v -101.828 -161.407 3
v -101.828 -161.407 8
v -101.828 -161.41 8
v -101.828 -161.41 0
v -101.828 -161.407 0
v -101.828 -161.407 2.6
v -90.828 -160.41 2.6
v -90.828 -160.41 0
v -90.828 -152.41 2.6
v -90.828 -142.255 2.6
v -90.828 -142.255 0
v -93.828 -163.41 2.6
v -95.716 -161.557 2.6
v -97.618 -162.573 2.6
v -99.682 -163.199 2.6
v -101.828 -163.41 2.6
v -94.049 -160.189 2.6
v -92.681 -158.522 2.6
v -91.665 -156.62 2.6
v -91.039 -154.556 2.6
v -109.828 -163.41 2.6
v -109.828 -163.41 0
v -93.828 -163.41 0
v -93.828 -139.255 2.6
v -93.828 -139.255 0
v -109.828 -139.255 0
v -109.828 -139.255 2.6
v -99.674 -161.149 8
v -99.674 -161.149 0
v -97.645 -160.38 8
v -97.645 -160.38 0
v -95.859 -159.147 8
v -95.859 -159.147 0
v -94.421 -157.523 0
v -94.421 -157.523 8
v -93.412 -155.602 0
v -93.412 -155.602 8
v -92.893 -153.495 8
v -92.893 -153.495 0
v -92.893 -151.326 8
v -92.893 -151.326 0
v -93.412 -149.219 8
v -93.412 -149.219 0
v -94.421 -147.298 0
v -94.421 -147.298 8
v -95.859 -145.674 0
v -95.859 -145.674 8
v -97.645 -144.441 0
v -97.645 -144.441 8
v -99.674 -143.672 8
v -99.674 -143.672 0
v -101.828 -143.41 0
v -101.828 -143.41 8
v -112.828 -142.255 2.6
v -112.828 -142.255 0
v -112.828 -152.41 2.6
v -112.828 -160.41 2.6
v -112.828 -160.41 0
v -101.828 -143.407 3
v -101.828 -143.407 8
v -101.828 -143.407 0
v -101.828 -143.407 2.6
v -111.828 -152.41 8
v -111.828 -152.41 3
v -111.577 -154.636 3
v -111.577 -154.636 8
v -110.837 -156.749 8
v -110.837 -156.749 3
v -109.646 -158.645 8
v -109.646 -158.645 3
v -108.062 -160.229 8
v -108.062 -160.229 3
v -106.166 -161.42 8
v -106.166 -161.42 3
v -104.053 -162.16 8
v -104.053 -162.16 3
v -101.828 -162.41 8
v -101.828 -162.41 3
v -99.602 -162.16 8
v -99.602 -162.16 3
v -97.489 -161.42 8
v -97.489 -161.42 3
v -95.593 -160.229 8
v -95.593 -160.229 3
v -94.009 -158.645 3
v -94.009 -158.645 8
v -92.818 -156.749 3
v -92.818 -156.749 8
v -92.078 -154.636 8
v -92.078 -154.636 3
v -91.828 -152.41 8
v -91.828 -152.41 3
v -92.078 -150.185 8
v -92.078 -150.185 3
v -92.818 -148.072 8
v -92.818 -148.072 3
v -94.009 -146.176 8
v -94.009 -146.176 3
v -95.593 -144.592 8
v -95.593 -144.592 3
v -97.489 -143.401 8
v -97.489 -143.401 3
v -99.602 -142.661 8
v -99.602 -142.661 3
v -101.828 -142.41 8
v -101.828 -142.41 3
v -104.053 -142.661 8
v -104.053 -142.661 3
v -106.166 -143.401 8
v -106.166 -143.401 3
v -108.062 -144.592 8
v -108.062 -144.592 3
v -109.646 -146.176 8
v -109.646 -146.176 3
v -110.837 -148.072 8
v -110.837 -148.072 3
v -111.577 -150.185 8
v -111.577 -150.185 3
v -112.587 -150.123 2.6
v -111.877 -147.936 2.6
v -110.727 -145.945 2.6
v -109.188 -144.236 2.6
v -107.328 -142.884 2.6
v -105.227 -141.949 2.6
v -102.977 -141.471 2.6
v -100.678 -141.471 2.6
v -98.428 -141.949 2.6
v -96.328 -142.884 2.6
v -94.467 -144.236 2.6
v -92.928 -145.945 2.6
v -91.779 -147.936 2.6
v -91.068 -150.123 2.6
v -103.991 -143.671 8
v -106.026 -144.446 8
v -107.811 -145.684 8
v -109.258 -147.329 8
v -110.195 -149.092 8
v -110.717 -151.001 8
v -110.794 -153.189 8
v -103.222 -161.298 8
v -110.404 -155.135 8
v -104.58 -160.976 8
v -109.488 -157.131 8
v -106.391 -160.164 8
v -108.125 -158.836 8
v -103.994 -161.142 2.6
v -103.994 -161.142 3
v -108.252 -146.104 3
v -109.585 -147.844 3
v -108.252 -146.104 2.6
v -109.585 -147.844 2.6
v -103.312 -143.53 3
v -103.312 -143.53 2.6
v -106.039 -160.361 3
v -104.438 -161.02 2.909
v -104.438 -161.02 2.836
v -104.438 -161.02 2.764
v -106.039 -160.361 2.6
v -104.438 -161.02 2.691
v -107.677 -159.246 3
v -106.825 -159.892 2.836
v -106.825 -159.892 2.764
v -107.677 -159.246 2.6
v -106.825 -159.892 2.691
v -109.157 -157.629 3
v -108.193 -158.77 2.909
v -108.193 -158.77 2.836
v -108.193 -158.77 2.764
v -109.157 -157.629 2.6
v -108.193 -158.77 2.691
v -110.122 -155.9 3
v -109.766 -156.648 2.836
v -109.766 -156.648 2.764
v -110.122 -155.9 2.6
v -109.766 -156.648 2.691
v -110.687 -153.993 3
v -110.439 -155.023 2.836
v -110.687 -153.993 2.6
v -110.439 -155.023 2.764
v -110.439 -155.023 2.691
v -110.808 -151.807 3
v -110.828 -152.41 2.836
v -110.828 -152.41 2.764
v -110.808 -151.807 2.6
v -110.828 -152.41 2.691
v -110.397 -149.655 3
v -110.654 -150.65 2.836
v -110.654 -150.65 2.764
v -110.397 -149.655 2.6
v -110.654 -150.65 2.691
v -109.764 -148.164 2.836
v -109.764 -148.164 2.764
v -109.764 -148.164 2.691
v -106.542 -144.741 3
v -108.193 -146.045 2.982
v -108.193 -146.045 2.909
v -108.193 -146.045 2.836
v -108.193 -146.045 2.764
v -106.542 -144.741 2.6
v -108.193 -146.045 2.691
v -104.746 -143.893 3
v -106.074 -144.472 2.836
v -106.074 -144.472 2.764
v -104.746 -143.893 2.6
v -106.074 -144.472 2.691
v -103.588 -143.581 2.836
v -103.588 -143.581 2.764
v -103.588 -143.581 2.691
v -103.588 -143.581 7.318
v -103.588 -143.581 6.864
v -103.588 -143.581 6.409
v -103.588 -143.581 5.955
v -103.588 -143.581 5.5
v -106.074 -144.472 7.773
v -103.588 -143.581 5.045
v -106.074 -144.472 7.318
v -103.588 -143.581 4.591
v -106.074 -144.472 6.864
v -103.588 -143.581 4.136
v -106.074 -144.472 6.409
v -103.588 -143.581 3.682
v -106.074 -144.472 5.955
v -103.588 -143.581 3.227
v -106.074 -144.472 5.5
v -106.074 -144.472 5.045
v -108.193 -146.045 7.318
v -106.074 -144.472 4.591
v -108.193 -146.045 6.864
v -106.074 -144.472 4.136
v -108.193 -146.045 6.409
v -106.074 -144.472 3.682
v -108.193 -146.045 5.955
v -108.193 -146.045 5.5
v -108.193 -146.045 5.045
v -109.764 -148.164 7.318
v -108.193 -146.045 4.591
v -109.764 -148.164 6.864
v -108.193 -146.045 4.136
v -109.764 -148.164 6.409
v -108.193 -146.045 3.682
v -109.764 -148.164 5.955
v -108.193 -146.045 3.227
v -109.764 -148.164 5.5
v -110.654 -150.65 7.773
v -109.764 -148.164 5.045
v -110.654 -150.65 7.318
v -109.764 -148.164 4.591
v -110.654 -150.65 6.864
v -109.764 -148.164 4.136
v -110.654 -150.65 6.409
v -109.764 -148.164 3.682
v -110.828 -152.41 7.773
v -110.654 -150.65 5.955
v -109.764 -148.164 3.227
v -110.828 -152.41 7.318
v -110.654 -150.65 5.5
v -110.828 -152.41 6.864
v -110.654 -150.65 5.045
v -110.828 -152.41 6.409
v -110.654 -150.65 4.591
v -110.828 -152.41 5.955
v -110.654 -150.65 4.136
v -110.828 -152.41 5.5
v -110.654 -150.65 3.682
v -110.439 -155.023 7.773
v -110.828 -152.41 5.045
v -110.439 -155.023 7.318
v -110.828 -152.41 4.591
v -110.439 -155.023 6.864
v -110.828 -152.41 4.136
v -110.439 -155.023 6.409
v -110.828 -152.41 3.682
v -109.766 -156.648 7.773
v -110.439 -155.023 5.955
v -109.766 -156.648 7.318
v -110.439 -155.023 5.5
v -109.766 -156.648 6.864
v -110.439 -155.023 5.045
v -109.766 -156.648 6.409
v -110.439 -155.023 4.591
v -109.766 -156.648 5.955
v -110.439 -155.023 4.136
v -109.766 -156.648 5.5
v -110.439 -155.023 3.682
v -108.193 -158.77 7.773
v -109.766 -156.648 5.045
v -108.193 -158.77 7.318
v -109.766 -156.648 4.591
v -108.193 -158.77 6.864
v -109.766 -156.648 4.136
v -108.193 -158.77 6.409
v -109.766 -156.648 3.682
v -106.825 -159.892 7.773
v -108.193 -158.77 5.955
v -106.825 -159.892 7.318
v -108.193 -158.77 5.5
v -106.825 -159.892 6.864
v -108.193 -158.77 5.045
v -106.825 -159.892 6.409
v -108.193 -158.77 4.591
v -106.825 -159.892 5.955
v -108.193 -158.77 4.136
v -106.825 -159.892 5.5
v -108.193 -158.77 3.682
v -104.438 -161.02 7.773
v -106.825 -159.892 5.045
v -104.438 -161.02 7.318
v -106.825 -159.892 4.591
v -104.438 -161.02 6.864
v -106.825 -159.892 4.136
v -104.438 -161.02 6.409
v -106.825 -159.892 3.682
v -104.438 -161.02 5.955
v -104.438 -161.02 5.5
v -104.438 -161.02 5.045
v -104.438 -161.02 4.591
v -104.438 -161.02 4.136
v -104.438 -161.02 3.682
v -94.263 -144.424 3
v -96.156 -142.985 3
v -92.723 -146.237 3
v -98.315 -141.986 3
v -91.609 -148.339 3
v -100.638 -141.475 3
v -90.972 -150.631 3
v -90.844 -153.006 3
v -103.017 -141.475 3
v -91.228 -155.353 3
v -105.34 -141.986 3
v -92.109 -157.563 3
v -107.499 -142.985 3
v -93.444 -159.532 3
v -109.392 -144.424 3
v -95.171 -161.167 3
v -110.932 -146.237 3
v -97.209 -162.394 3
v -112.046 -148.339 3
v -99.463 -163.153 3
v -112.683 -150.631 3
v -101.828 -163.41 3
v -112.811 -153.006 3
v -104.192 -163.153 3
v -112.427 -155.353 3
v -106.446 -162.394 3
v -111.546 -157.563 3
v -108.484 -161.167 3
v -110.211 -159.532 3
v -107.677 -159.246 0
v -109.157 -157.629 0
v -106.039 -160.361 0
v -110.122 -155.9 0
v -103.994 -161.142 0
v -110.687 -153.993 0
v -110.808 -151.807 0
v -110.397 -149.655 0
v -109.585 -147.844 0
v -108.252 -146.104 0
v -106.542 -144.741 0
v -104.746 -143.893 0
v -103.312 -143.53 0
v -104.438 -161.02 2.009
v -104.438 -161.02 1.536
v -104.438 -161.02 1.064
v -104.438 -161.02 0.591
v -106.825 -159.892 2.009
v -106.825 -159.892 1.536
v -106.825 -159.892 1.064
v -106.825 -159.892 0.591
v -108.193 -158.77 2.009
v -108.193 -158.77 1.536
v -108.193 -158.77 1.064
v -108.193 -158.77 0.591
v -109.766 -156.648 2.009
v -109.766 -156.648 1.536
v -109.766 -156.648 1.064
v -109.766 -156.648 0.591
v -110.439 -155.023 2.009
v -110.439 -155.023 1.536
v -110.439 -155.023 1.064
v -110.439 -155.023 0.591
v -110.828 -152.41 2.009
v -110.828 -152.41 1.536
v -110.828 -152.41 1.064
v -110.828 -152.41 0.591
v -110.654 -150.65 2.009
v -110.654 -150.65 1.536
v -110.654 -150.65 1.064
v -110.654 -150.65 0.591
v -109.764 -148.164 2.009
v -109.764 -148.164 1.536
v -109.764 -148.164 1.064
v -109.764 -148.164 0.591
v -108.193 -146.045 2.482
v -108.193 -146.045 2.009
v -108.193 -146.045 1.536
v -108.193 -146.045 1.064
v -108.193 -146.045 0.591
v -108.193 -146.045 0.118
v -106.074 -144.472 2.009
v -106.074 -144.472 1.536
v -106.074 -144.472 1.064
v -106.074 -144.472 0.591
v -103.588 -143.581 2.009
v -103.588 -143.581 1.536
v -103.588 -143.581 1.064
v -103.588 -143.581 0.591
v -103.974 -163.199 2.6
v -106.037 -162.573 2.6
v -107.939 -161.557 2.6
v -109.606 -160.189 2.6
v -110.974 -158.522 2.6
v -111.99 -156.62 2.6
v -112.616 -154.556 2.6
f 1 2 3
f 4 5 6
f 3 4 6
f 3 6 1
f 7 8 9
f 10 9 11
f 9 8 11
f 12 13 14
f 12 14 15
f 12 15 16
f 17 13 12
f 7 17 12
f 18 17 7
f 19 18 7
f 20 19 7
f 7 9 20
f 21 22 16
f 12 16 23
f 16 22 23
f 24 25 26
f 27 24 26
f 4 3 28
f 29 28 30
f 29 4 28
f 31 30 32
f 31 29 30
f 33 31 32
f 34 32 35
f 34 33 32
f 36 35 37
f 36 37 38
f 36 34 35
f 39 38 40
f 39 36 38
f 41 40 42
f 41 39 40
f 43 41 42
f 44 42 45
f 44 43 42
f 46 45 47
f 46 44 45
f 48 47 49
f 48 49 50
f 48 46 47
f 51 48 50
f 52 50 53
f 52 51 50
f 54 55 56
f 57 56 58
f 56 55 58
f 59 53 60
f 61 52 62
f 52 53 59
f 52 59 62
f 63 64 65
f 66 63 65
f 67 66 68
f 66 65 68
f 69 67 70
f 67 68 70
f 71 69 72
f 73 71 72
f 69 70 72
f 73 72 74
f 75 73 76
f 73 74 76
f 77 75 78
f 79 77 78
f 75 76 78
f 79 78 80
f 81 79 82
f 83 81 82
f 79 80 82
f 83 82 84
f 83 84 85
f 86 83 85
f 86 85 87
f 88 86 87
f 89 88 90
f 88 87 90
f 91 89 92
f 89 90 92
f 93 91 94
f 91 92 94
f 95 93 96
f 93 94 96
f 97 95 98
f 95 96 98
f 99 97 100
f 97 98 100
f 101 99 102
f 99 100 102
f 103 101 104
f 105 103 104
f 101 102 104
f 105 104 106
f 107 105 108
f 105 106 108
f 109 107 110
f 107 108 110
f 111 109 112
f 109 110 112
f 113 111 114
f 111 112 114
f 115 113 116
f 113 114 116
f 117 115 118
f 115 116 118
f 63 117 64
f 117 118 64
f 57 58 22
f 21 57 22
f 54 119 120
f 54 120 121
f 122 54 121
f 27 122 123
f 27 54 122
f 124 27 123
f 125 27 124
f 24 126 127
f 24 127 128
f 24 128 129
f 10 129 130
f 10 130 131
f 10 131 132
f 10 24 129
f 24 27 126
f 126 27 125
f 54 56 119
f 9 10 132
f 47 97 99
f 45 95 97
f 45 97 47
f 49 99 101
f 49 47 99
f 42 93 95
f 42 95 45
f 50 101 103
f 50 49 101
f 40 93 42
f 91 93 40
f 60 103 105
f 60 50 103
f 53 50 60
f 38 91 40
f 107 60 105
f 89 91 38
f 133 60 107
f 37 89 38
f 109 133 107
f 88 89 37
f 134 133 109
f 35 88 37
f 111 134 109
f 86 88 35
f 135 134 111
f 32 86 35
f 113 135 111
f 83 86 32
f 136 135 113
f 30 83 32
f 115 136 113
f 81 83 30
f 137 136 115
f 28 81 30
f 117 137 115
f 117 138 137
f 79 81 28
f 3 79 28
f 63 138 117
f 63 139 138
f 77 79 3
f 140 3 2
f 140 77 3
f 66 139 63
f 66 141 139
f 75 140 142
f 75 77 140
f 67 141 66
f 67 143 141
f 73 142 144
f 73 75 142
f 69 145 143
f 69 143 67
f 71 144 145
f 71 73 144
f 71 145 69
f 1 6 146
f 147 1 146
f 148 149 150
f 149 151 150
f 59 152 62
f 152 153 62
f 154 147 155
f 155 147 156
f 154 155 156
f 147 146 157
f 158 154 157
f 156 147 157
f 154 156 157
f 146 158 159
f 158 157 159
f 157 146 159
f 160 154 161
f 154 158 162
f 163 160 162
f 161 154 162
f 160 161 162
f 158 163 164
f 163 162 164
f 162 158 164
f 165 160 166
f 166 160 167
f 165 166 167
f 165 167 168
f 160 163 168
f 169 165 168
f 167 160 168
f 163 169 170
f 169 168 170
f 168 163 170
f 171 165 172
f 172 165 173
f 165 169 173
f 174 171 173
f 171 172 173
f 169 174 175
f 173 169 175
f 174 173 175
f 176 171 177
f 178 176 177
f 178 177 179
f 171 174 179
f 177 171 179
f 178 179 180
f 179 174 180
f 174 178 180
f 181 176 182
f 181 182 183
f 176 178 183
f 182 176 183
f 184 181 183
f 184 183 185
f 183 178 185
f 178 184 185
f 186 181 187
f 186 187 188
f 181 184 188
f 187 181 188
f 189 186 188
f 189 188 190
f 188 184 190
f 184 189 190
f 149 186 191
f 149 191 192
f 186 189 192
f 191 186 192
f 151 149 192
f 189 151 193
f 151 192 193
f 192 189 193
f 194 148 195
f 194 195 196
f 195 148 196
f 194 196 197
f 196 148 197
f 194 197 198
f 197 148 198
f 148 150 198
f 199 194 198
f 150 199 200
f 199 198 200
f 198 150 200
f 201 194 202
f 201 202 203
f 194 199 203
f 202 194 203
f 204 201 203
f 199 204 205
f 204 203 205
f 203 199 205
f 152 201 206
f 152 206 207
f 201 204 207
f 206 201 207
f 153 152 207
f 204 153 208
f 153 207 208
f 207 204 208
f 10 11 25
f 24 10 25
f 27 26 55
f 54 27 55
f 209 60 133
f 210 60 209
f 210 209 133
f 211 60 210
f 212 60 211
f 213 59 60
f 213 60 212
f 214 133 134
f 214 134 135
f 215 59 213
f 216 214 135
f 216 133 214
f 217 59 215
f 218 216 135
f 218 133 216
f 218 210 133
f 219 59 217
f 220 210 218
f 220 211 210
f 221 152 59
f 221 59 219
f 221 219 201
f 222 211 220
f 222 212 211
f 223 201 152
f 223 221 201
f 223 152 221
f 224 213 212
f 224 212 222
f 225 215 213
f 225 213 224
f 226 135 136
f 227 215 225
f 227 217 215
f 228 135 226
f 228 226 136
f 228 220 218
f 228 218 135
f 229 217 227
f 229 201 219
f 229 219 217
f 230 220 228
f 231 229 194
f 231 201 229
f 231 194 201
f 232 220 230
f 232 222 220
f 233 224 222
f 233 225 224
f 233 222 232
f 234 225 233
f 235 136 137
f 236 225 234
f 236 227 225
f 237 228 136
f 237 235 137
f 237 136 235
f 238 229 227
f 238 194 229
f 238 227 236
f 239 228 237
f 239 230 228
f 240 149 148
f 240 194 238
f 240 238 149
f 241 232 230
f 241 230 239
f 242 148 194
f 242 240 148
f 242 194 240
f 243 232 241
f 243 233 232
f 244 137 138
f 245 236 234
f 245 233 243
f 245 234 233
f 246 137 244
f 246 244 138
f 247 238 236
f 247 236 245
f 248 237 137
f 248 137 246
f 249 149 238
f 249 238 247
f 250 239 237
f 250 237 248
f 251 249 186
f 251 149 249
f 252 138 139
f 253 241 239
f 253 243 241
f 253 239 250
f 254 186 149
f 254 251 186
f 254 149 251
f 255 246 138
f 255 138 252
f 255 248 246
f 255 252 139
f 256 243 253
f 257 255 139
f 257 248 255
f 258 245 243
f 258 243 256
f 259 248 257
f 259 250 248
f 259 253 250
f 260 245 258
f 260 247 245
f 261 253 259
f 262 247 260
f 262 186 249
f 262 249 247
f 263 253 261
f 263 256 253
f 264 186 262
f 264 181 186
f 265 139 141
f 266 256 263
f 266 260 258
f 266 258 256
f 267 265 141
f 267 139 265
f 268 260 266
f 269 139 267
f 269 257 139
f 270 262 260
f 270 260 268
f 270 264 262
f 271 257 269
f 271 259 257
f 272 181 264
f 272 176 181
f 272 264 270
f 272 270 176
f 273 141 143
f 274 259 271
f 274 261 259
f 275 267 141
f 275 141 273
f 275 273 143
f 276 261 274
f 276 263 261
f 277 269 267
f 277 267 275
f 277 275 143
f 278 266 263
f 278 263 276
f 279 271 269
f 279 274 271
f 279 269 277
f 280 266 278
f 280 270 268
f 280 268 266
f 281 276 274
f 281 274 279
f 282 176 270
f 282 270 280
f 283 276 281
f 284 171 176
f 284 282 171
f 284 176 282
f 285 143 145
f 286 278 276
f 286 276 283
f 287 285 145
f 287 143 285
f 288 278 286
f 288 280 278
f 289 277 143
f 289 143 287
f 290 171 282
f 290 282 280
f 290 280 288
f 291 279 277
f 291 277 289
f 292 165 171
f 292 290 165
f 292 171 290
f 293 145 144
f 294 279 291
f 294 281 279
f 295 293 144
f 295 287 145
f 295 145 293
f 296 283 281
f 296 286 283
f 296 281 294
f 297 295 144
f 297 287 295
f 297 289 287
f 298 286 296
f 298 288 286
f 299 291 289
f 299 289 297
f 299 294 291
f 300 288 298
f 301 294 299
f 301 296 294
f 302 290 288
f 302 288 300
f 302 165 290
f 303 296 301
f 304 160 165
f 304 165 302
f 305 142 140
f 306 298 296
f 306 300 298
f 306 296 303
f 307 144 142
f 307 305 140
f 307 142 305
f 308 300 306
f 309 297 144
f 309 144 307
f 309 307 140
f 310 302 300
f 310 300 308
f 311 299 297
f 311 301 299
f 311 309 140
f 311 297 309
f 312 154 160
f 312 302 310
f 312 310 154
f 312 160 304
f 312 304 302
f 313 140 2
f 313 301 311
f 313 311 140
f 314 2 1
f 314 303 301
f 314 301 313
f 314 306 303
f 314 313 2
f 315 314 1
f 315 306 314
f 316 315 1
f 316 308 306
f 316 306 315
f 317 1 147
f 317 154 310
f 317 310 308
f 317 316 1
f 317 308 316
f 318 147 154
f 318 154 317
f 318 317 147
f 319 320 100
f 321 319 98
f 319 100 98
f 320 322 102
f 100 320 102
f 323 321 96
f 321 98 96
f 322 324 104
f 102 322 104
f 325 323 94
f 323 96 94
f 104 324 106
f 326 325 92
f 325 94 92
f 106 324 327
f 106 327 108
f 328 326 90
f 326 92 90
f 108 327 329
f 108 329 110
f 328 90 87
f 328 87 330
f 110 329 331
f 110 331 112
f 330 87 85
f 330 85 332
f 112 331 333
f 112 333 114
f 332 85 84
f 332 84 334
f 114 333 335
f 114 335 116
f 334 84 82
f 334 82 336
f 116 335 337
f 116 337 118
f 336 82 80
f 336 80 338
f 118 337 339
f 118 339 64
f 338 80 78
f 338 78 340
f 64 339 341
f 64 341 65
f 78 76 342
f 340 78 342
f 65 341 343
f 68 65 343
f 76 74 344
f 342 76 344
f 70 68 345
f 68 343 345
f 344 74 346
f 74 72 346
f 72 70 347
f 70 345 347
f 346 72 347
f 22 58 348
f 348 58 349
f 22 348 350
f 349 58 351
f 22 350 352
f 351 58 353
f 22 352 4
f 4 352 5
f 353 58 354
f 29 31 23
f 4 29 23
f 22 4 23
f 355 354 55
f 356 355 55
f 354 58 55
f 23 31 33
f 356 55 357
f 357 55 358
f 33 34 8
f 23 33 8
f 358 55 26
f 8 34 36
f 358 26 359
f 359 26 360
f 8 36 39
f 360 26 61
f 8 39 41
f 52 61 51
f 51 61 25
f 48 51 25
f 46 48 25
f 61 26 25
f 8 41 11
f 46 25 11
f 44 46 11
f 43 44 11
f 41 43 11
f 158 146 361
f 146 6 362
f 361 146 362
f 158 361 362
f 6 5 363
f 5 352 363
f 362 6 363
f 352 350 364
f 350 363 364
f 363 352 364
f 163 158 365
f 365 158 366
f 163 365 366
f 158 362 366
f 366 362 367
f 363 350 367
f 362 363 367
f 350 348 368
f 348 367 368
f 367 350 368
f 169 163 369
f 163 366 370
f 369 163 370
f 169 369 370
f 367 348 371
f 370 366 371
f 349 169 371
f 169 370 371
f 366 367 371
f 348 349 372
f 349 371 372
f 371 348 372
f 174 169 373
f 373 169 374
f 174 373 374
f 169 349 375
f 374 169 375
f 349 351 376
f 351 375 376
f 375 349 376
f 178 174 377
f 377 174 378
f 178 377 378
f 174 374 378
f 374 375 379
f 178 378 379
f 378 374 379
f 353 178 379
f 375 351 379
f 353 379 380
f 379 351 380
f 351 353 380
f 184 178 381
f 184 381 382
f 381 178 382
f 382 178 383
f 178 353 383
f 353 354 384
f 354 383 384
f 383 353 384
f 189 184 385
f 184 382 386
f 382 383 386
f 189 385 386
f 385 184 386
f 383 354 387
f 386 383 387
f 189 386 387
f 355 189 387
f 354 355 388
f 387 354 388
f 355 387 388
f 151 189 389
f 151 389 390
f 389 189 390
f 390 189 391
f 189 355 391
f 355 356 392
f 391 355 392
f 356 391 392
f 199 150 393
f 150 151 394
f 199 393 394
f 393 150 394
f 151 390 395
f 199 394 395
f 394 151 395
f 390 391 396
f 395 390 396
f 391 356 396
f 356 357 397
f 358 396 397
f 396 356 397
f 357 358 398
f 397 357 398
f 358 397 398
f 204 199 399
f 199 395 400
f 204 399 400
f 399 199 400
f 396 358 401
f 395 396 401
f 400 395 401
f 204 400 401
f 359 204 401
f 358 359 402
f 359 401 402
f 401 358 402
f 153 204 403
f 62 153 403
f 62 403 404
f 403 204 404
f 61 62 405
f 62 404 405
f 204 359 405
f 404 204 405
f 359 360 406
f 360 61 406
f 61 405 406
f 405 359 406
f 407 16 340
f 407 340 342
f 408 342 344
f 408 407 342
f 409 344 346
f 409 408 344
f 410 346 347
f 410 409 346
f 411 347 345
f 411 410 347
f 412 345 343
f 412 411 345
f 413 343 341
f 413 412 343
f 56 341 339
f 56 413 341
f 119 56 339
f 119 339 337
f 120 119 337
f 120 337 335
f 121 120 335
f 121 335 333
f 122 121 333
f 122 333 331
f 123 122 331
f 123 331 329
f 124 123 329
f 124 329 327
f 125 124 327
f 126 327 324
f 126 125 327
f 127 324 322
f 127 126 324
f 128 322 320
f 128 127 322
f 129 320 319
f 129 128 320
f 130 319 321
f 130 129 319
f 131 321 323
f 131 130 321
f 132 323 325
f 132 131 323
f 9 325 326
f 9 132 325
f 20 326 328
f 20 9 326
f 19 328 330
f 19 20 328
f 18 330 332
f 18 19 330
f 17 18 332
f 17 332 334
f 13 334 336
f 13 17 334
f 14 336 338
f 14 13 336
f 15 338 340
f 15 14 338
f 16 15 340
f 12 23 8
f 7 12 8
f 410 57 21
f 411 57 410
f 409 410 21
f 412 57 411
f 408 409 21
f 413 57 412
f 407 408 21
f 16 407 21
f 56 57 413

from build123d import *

# Parameters (mm, degrees)
BOSS_EXTRUDE1_DEPTH = 2.6
BOSS_EXTRUDE2_START = 0.4
SKETCH2_R           = 11
BOSS_EXTRUDE2_DEPTH = 0.4
SKETCH3_R           = 10
BOSS_EXTRUDE3_DEPTH = 5


with BuildPart() as part:
    # Sketch1 → Boss-Extrude1 (new body)
    with BuildSketch(Plane.XY):
        Polygon((-101.82751654, -139.254588807), (-109.82751654, -139.254588807), (-112.82751654, -142.254588807), (-112.82751654, -160.410438888), (-109.82751654, -163.410438888), (-101.82751654, -163.410438888), (-93.82751654, -163.410438888), (-90.82751654, -160.410438888), (-90.82751654, -142.254588807), (-93.82751654, -139.254588807), align=None)
        with BuildLine():
            Line((-101.82751654, -161.410438888), (-101.82751654, -161.406823358))
            add(Edge.make_bspline(
                [(-101.82751654, -161.406823358), (-102.422162271, -161.406823358), (-103.006870259, -161.348469799), (-103.869635205, -161.176988515), (-104.154822959, -161.1057322), (-104.720287744, -160.934384241), (-105.001330007, -160.833809548), (-105.818842439, -160.494941156), (-106.33582072, -160.218450477), (-107.314217622, -159.565215144), (-107.777447082, -159.184998049), (-108.607719596, -158.354451471), (-108.980275796, -157.901273798), (-109.473711648, -157.16329018), (-109.626905607, -156.907604181), (-109.904538968, -156.387928298), (-110.155344462, -155.857224862), (-110.353303759, -155.304799077), (-110.524479072, -154.741363777), (-110.596954867, -154.452589203), (-110.770224625, -153.581187835), (-110.827307979, -152.997176095), (-110.827619973, -152.116665053), (-110.813402769, -151.822407076), (-110.755453282, -151.232336564), (-110.711753861, -150.938362019), (-110.539397258, -150.07260899), (-110.369409104, -149.511563453), (-110.031331697, -148.69431731), (-109.903855236, -148.424565494), (-109.625080406, -147.903123691), (-109.473781689, -147.650944456), (-108.985007402, -146.919418072), (-108.612994329, -146.464837975), (-107.773025896, -145.624478569), (-107.317394389, -145.251329051), (-106.586246745, -144.762472579), (-106.334327243, -144.611225122), (-105.813734345, -144.33263421), (-105.543874944, -144.204932828), (-104.725722152, -143.866107062), (-104.164612328, -143.6960009), (-103.011425471, -143.465984444), (-102.414902795, -143.407128867), (-101.82751654, -143.407128867)],
                knots=[0, 0, 0, 0, 0.0625, 0.0625, 0.09375, 0.09375, 0.125, 0.125, 0.1875, 0.1875, 0.25, 0.25, 0.3125, 0.3125, 0.34375, 0.34375, 0.375, 0.40625, 0.40625, 0.4375, 0.4375, 0.5, 0.5, 0.53125, 0.53125, 0.5625, 0.5625, 0.625, 0.625, 0.65625, 0.65625, 0.6875, 0.6875, 0.75, 0.75, 0.8125, 0.8125, 0.84375, 0.84375, 0.875, 0.875, 0.9375, 0.9375, 1, 1, 1, 1], degree=3))
            Line((-101.82751654, -143.407128867), (-101.82751654, -143.410438888))
            ThreePointArc((-101.82751654, -143.410438888), (-92.82751654, -152.410438888), (-101.82751654, -161.410438888))
        make_face(mode=Mode.SUBTRACT)
    extrude(amount=BOSS_EXTRUDE1_DEPTH)

    # Sketch2 → Boss-Extrude2 (add)
    with BuildSketch(Plane(origin=(0, 0, 3), x_dir=(-1, 0, 0), z_dir=(0, 0, -1)).offset(BOSS_EXTRUDE2_START)):
        with Locations(Location((101.82751654, -152.410438888, 0), (0, 0, 270))):
            Circle(SKETCH2_R)
        with BuildLine():
            Line((101.82751654, -161.410438888), (101.82751654, -161.406823358))
            add(Edge.make_bspline(
                [(101.82751654, -161.406823358), (102.422162271, -161.406823358), (103.006870259, -161.348469799), (103.869635205, -161.176988515), (104.154822959, -161.1057322), (104.720287744, -160.934384241), (105.001330007, -160.833809548), (105.818842439, -160.494941156), (106.33582072, -160.218450477), (107.314217622, -159.565215144), (107.777447082, -159.184998049), (108.607719596, -158.354451471), (108.980275796, -157.901273798), (109.473711648, -157.16329018), (109.626905607, -156.907604181), (109.904538968, -156.387928298), (110.155344462, -155.857224862), (110.353303759, -155.304799077), (110.524479072, -154.741363777), (110.596954867, -154.452589203), (110.770224625, -153.581187835), (110.827307979, -152.997176095), (110.827619973, -152.116665053), (110.813402769, -151.822407076), (110.755453282, -151.232336564), (110.711753861, -150.938362019), (110.539397258, -150.07260899), (110.369409104, -149.511563453), (110.031331697, -148.69431731), (109.903855236, -148.424565494), (109.625080406, -147.903123691), (109.473781689, -147.650944456), (108.985007402, -146.919418072), (108.612994329, -146.464837975), (107.773025896, -145.624478569), (107.317394389, -145.251329051), (106.586246745, -144.762472579), (106.334327243, -144.611225122), (105.813734345, -144.33263421), (105.543874944, -144.204932828), (104.725722152, -143.866107062), (104.164612328, -143.6960009), (103.011425471, -143.465984444), (102.414902795, -143.407128867), (101.82751654, -143.407128867)],
                knots=[0, 0, 0, 0, 0.0625, 0.0625, 0.09375, 0.09375, 0.125, 0.125, 0.1875, 0.1875, 0.25, 0.25, 0.3125, 0.3125, 0.34375, 0.34375, 0.375, 0.40625, 0.40625, 0.4375, 0.4375, 0.5, 0.5, 0.53125, 0.53125, 0.5625, 0.5625, 0.625, 0.625, 0.65625, 0.65625, 0.6875, 0.6875, 0.75, 0.75, 0.8125, 0.8125, 0.84375, 0.84375, 0.875, 0.875, 0.9375, 0.9375, 1, 1, 1, 1], degree=3))
            Line((101.82751654, -143.407128867), (101.82751654, -143.410438888))
            ThreePointArc((101.82751654, -143.410438888), (92.82751654, -152.410438888), (101.82751654, -161.410438888))
        make_face(mode=Mode.SUBTRACT)
    extrude(amount=-BOSS_EXTRUDE2_DEPTH)

    # Sketch3 → Boss-Extrude3 (add)
    with BuildSketch(Plane.XY.offset(3)):
        with Locations(Location((-101.82751654, -152.410438888, 0), (0, 0, 180))):
            Circle(SKETCH3_R)
        with BuildLine():
            Line((-101.82751654, -161.406823358), (-101.82751654, -161.410438888))
            ThreePointArc((-101.82751654, -161.410438888), (-92.82751654, -152.410438888), (-101.82751654, -143.410438888))
            Line((-101.82751654, -143.410438888), (-101.82751654, -143.407128867))
            add(Edge.make_bspline(
                [(-101.82751654, -143.407128867), (-102.414902795, -143.407128867), (-103.011425471, -143.465984444), (-104.164612328, -143.6960009), (-104.725722152, -143.866107062), (-105.543874944, -144.204932828), (-105.813734345, -144.33263421), (-106.334327243, -144.611225122), (-106.586246745, -144.762472579), (-107.317394389, -145.251329051), (-107.773025896, -145.624478569), (-108.612994329, -146.464837975), (-108.985007402, -146.919418072), (-109.473781689, -147.650944456), (-109.625080406, -147.903123691), (-109.903855236, -148.424565494), (-110.031331697, -148.69431731), (-110.369409104, -149.511563453), (-110.539397258, -150.07260899), (-110.711753861, -150.938362019), (-110.755453282, -151.232336564), (-110.813402769, -151.822407076), (-110.827619973, -152.116665053), (-110.827307979, -152.997176095), (-110.770224625, -153.581187835), (-110.596954867, -154.452589203), (-110.524479072, -154.741363777), (-110.353303759, -155.304799077), (-110.155344462, -155.857224862), (-109.904538968, -156.387928298), (-109.626905607, -156.907604181), (-109.473711648, -157.16329018), (-108.980275796, -157.901273798), (-108.607719596, -158.354451471), (-107.777447082, -159.184998049), (-107.314217622, -159.565215144), (-106.33582072, -160.218450477), (-105.818842439, -160.494941156), (-105.001330007, -160.833809548), (-104.720287744, -160.934384241), (-104.154822959, -161.1057322), (-103.869635205, -161.176988515), (-103.006870259, -161.348469799), (-102.422162271, -161.406823358), (-101.82751654, -161.406823358)],
                knots=[0, 0, 0, 0, 0.0625, 0.0625, 0.125, 0.125, 0.15625, 0.15625, 0.1875, 0.1875, 0.25, 0.25, 0.3125, 0.3125, 0.34375, 0.34375, 0.375, 0.375, 0.4375, 0.4375, 0.46875, 0.46875, 0.5, 0.5, 0.5625, 0.5625, 0.59375, 0.59375, 0.625, 0.65625, 0.65625, 0.6875, 0.6875, 0.75, 0.75, 0.8125, 0.8125, 0.875, 0.875, 0.90625, 0.90625, 0.9375, 0.9375, 1, 1, 1, 1], degree=3))
        make_face(mode=Mode.SUBTRACT)
    extrude(amount=BOSS_EXTRUDE3_DEPTH)


solid = part.part
